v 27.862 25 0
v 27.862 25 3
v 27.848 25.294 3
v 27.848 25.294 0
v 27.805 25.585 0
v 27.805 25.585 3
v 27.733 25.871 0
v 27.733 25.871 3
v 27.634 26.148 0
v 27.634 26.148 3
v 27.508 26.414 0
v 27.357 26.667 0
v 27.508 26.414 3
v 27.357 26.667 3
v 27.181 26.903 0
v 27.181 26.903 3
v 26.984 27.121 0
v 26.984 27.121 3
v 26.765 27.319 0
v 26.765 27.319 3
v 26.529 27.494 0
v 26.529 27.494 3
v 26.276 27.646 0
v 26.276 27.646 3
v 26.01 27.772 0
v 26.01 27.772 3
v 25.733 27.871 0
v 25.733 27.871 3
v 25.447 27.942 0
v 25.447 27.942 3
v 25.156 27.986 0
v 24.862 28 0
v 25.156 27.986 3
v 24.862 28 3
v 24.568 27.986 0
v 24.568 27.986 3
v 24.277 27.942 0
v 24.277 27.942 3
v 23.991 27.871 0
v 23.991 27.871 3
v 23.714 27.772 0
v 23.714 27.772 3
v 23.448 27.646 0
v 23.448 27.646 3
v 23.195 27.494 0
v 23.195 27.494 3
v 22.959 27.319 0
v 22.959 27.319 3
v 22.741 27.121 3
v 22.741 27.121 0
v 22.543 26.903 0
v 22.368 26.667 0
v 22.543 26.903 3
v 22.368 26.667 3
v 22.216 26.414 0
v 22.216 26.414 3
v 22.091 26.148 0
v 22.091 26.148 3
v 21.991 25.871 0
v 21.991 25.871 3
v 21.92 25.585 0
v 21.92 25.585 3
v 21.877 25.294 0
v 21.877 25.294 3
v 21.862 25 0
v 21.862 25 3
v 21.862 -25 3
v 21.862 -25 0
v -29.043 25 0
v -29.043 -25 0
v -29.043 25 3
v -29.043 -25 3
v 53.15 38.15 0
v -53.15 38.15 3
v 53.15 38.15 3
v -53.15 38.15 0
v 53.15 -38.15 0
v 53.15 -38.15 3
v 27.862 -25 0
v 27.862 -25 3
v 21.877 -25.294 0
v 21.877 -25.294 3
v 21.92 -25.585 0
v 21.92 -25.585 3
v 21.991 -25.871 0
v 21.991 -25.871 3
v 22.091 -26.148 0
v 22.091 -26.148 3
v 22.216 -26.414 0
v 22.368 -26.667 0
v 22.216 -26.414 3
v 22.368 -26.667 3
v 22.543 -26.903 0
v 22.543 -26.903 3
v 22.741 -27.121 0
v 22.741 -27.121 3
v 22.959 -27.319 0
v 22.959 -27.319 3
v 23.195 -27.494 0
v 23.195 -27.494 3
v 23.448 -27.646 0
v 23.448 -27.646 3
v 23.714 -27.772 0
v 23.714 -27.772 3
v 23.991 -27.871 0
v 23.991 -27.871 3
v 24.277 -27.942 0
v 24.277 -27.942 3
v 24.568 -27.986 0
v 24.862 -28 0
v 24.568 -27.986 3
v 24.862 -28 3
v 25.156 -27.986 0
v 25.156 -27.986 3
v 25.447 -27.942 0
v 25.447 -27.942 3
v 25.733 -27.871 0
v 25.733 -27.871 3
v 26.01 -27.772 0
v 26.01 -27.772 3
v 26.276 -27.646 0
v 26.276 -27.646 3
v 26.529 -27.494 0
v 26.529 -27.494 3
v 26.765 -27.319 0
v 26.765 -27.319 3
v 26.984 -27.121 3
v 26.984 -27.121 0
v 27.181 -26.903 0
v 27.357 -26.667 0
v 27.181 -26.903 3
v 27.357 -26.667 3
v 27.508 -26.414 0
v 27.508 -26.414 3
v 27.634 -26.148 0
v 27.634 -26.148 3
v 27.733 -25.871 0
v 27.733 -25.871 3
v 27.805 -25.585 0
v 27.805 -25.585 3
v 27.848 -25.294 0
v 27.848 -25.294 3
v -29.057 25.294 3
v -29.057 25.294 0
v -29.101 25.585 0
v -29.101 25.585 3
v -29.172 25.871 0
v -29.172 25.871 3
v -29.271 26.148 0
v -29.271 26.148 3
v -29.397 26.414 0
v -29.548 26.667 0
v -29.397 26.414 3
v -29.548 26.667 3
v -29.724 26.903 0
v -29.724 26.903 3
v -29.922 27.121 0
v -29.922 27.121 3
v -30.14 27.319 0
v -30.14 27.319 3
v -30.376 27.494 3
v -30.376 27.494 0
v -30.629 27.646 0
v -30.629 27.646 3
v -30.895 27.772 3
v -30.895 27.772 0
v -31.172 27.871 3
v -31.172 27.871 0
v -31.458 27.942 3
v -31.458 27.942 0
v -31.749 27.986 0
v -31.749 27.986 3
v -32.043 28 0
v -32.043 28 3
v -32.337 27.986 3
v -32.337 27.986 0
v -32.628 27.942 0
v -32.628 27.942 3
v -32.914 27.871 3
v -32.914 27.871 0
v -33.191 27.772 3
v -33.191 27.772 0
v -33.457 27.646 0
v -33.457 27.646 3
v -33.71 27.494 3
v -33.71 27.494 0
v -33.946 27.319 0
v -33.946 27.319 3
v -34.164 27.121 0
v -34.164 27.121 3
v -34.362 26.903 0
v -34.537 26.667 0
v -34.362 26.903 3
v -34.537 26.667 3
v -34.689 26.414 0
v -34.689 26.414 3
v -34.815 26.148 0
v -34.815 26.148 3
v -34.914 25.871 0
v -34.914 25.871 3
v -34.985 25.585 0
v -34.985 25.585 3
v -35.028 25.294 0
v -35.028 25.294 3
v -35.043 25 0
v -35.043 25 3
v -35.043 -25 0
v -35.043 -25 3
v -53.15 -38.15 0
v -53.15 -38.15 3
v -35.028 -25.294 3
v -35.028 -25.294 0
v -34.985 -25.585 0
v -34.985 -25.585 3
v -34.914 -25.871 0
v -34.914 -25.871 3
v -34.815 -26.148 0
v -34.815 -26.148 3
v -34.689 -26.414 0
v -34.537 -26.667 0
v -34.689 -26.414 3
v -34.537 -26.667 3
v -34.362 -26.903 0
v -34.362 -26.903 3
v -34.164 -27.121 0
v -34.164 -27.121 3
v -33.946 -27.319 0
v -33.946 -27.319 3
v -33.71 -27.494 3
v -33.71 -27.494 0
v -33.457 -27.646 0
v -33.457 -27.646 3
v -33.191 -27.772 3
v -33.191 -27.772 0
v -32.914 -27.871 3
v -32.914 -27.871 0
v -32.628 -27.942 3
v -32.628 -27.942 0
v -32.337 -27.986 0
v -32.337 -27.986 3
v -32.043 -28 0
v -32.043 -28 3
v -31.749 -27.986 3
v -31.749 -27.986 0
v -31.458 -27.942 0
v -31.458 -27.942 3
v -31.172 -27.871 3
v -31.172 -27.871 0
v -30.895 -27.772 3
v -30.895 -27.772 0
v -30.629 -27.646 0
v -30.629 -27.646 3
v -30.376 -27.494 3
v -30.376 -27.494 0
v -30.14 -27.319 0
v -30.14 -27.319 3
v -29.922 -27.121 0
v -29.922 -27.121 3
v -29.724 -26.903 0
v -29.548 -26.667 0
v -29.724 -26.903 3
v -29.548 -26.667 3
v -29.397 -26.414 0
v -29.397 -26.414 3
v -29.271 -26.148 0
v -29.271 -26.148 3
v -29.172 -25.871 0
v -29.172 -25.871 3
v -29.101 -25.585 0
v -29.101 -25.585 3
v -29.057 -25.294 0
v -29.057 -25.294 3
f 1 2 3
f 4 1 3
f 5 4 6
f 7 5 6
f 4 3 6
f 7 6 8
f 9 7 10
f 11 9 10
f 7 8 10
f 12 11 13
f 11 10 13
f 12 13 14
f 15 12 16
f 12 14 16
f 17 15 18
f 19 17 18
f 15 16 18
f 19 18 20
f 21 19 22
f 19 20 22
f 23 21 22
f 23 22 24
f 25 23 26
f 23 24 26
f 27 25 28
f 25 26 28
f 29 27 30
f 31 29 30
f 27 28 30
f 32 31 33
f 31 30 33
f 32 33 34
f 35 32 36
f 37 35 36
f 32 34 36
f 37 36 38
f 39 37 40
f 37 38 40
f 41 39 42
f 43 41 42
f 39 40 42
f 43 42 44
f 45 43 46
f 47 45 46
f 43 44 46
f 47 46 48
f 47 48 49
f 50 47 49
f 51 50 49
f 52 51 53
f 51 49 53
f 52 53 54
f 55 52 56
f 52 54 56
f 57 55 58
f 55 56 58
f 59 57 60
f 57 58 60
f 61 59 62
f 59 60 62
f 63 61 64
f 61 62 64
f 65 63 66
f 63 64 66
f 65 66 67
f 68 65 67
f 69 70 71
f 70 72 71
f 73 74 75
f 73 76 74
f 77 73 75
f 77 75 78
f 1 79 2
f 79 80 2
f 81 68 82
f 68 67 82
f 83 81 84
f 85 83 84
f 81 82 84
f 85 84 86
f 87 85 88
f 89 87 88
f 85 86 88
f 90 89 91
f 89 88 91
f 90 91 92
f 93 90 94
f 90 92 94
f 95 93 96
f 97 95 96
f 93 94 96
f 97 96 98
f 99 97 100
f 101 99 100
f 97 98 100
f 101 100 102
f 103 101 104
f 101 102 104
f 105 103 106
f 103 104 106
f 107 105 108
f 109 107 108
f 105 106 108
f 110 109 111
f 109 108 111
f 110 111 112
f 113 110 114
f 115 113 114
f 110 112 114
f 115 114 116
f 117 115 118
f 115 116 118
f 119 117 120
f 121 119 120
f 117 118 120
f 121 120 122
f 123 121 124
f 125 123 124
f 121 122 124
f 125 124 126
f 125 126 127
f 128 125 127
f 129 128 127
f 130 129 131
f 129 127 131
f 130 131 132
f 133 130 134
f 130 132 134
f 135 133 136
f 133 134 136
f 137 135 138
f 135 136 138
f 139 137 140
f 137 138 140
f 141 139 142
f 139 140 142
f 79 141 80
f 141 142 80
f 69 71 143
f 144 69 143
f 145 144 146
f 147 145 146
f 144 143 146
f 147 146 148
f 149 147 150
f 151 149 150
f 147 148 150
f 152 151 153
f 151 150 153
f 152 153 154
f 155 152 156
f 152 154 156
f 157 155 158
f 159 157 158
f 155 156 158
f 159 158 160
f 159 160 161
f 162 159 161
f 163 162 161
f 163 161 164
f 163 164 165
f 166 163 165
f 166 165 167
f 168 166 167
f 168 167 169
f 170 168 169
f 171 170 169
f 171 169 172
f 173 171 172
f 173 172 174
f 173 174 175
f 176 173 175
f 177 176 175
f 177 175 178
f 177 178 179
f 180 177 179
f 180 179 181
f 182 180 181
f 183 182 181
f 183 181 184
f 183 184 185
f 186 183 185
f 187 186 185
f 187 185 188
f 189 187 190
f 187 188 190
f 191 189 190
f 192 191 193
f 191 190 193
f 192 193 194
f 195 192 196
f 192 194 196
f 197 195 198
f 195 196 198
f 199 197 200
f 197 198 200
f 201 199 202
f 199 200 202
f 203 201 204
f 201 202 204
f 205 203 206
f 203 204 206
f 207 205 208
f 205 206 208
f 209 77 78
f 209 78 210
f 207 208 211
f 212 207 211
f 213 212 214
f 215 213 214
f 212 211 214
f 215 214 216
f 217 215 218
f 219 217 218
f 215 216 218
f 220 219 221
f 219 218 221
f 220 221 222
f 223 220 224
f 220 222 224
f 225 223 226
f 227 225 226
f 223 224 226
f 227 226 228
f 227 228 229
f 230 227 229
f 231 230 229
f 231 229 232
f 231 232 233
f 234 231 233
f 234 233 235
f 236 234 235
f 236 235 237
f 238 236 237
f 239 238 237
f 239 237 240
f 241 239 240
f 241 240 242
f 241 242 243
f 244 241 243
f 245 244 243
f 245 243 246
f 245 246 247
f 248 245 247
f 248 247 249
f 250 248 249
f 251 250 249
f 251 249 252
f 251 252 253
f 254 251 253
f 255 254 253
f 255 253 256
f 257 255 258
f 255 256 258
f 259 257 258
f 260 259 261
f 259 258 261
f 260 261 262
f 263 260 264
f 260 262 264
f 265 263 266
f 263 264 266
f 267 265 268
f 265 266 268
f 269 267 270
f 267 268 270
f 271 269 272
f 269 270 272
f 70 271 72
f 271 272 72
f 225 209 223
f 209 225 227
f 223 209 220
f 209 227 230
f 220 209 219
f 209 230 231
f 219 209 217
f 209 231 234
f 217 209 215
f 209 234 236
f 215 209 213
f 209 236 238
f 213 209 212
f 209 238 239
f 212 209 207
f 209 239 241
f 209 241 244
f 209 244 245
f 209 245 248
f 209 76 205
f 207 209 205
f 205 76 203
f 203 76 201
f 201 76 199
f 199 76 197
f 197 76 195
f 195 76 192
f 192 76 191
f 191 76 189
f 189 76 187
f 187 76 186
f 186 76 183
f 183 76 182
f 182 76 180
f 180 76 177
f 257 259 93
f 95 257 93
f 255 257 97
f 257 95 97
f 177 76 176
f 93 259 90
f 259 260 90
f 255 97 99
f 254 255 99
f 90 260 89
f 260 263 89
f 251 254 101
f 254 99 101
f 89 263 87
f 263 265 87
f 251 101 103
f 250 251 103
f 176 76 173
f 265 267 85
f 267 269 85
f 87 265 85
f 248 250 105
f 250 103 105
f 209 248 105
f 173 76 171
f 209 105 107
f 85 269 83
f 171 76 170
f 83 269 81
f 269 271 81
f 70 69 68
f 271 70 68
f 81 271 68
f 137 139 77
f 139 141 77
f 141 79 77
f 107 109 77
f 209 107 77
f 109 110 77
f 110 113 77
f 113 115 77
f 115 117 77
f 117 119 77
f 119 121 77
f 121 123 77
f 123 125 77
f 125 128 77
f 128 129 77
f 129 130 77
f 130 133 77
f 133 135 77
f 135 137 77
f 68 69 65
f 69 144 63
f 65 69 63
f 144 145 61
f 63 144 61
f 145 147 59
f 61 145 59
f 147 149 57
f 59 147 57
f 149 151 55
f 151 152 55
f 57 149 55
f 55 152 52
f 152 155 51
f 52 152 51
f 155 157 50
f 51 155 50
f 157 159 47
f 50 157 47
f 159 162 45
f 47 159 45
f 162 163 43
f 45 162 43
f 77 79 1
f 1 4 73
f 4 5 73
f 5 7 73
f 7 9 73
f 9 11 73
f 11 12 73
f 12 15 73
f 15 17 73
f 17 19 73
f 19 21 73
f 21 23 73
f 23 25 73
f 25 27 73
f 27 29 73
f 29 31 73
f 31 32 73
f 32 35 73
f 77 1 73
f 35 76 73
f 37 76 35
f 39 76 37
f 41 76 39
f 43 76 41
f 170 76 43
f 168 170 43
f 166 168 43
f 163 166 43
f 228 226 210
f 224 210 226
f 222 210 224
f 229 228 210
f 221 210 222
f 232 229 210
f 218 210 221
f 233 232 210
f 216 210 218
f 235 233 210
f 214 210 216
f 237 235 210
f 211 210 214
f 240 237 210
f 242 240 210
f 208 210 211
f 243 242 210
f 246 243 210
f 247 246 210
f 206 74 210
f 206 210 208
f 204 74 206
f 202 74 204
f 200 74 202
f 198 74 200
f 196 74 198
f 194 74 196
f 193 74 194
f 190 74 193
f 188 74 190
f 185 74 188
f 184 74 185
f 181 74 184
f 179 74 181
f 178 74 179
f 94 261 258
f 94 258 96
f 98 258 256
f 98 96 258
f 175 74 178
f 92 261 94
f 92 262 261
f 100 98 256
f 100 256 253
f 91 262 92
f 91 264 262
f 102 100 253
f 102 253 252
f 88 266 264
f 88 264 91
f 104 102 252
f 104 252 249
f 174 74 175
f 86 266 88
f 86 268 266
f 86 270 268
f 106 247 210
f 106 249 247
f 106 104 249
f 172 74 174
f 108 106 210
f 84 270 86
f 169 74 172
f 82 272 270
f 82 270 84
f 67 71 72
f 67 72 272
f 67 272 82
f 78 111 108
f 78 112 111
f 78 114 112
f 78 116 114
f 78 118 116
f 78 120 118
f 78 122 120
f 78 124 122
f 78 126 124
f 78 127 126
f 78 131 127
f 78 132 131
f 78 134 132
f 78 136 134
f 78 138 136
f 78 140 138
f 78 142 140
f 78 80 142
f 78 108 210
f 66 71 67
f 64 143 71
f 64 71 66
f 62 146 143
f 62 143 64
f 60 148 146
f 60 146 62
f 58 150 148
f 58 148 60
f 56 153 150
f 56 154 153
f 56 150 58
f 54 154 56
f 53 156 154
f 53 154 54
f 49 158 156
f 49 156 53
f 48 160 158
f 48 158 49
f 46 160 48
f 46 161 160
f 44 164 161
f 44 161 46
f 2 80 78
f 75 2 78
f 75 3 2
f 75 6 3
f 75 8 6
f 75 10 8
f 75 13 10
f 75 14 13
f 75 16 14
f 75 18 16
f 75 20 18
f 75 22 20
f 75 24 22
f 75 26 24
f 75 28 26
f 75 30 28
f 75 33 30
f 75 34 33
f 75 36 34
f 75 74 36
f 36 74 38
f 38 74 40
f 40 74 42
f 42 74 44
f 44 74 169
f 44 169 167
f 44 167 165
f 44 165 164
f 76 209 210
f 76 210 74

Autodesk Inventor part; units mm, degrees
ref_plane "YZ Plane" through (0, 0, 0) normal (1, 0, 0) x (0, 1, 0)
ref_plane "XZ Plane" through (0, 0, 0) normal (0, 1, 0) x (-1, 0, 0)
ref_plane "XY Plane" through (0, 0, 0) normal (0, 0, 1) x (1, 0, 0)
sketch "草图1" plane through (0, 0, 0) normal (0, 0, 1) x (1, 0, 0)
  line L0 (53.15, -38.15) -> (-53.15, -38.15)
  line L1 (-53.15, -38.15) -> (-53.15, 38.15)
  line L2 (-53.15, 38.15) -> (53.15, 38.15)
  line L3 (53.15, 38.15) -> (53.15, -38.15)
  line L4 (53.15, -38.15) -> (-53.15, 38.15) construction
  line L5 (-53.15, -38.15) -> (53.15, 38.15) construction
  point P0 (0, 0)
  dimension "d0" = 106.3
  dimension "d1" = 76.3
extrude "拉伸1" add sketch "草图1" along normal blind 3
sketch "草图4" plane through (0, 0, 3) normal (0, 0, 1) x (1, 0, 0)
  line L0 (24.8622, 25) -> (24.8622, -25) construction
  line L1 (21.8622, 25) -> (21.8622, -25)
  line L2 (27.8622, -25) -> (27.8622, 25)
  arc A0 (27.8622, 25) -> (21.8622, 25) centre (24.8622, 25) ccw
  arc A1 (21.8622, -25) -> (27.8622, -25) centre (24.8622, -25) ccw
  line L3 (-32.0429, 25) -> (-32.0429, -25) construction
  line L4 (-35.0429, 25) -> (-35.0429, -25)
  line L5 (-29.0429, -25) -> (-29.0429, 25)
  arc A2 (-29.0429, 25) -> (-35.0429, 25) centre (-32.0429, 25) ccw
  arc A3 (-35.0429, -25) -> (-29.0429, -25) centre (-32.0429, -25) ccw
  point P0 (0, 0)
  point P1 (24.8622, 0)
  point P2 (-32.0429, 0)
  dimension "d4" = 50
  dimension "d5" = 6
  dimension "d6" = 50
  dimension "d7" = 6
extrude "拉伸2" cut sketch "草图4" against normal blind 3
